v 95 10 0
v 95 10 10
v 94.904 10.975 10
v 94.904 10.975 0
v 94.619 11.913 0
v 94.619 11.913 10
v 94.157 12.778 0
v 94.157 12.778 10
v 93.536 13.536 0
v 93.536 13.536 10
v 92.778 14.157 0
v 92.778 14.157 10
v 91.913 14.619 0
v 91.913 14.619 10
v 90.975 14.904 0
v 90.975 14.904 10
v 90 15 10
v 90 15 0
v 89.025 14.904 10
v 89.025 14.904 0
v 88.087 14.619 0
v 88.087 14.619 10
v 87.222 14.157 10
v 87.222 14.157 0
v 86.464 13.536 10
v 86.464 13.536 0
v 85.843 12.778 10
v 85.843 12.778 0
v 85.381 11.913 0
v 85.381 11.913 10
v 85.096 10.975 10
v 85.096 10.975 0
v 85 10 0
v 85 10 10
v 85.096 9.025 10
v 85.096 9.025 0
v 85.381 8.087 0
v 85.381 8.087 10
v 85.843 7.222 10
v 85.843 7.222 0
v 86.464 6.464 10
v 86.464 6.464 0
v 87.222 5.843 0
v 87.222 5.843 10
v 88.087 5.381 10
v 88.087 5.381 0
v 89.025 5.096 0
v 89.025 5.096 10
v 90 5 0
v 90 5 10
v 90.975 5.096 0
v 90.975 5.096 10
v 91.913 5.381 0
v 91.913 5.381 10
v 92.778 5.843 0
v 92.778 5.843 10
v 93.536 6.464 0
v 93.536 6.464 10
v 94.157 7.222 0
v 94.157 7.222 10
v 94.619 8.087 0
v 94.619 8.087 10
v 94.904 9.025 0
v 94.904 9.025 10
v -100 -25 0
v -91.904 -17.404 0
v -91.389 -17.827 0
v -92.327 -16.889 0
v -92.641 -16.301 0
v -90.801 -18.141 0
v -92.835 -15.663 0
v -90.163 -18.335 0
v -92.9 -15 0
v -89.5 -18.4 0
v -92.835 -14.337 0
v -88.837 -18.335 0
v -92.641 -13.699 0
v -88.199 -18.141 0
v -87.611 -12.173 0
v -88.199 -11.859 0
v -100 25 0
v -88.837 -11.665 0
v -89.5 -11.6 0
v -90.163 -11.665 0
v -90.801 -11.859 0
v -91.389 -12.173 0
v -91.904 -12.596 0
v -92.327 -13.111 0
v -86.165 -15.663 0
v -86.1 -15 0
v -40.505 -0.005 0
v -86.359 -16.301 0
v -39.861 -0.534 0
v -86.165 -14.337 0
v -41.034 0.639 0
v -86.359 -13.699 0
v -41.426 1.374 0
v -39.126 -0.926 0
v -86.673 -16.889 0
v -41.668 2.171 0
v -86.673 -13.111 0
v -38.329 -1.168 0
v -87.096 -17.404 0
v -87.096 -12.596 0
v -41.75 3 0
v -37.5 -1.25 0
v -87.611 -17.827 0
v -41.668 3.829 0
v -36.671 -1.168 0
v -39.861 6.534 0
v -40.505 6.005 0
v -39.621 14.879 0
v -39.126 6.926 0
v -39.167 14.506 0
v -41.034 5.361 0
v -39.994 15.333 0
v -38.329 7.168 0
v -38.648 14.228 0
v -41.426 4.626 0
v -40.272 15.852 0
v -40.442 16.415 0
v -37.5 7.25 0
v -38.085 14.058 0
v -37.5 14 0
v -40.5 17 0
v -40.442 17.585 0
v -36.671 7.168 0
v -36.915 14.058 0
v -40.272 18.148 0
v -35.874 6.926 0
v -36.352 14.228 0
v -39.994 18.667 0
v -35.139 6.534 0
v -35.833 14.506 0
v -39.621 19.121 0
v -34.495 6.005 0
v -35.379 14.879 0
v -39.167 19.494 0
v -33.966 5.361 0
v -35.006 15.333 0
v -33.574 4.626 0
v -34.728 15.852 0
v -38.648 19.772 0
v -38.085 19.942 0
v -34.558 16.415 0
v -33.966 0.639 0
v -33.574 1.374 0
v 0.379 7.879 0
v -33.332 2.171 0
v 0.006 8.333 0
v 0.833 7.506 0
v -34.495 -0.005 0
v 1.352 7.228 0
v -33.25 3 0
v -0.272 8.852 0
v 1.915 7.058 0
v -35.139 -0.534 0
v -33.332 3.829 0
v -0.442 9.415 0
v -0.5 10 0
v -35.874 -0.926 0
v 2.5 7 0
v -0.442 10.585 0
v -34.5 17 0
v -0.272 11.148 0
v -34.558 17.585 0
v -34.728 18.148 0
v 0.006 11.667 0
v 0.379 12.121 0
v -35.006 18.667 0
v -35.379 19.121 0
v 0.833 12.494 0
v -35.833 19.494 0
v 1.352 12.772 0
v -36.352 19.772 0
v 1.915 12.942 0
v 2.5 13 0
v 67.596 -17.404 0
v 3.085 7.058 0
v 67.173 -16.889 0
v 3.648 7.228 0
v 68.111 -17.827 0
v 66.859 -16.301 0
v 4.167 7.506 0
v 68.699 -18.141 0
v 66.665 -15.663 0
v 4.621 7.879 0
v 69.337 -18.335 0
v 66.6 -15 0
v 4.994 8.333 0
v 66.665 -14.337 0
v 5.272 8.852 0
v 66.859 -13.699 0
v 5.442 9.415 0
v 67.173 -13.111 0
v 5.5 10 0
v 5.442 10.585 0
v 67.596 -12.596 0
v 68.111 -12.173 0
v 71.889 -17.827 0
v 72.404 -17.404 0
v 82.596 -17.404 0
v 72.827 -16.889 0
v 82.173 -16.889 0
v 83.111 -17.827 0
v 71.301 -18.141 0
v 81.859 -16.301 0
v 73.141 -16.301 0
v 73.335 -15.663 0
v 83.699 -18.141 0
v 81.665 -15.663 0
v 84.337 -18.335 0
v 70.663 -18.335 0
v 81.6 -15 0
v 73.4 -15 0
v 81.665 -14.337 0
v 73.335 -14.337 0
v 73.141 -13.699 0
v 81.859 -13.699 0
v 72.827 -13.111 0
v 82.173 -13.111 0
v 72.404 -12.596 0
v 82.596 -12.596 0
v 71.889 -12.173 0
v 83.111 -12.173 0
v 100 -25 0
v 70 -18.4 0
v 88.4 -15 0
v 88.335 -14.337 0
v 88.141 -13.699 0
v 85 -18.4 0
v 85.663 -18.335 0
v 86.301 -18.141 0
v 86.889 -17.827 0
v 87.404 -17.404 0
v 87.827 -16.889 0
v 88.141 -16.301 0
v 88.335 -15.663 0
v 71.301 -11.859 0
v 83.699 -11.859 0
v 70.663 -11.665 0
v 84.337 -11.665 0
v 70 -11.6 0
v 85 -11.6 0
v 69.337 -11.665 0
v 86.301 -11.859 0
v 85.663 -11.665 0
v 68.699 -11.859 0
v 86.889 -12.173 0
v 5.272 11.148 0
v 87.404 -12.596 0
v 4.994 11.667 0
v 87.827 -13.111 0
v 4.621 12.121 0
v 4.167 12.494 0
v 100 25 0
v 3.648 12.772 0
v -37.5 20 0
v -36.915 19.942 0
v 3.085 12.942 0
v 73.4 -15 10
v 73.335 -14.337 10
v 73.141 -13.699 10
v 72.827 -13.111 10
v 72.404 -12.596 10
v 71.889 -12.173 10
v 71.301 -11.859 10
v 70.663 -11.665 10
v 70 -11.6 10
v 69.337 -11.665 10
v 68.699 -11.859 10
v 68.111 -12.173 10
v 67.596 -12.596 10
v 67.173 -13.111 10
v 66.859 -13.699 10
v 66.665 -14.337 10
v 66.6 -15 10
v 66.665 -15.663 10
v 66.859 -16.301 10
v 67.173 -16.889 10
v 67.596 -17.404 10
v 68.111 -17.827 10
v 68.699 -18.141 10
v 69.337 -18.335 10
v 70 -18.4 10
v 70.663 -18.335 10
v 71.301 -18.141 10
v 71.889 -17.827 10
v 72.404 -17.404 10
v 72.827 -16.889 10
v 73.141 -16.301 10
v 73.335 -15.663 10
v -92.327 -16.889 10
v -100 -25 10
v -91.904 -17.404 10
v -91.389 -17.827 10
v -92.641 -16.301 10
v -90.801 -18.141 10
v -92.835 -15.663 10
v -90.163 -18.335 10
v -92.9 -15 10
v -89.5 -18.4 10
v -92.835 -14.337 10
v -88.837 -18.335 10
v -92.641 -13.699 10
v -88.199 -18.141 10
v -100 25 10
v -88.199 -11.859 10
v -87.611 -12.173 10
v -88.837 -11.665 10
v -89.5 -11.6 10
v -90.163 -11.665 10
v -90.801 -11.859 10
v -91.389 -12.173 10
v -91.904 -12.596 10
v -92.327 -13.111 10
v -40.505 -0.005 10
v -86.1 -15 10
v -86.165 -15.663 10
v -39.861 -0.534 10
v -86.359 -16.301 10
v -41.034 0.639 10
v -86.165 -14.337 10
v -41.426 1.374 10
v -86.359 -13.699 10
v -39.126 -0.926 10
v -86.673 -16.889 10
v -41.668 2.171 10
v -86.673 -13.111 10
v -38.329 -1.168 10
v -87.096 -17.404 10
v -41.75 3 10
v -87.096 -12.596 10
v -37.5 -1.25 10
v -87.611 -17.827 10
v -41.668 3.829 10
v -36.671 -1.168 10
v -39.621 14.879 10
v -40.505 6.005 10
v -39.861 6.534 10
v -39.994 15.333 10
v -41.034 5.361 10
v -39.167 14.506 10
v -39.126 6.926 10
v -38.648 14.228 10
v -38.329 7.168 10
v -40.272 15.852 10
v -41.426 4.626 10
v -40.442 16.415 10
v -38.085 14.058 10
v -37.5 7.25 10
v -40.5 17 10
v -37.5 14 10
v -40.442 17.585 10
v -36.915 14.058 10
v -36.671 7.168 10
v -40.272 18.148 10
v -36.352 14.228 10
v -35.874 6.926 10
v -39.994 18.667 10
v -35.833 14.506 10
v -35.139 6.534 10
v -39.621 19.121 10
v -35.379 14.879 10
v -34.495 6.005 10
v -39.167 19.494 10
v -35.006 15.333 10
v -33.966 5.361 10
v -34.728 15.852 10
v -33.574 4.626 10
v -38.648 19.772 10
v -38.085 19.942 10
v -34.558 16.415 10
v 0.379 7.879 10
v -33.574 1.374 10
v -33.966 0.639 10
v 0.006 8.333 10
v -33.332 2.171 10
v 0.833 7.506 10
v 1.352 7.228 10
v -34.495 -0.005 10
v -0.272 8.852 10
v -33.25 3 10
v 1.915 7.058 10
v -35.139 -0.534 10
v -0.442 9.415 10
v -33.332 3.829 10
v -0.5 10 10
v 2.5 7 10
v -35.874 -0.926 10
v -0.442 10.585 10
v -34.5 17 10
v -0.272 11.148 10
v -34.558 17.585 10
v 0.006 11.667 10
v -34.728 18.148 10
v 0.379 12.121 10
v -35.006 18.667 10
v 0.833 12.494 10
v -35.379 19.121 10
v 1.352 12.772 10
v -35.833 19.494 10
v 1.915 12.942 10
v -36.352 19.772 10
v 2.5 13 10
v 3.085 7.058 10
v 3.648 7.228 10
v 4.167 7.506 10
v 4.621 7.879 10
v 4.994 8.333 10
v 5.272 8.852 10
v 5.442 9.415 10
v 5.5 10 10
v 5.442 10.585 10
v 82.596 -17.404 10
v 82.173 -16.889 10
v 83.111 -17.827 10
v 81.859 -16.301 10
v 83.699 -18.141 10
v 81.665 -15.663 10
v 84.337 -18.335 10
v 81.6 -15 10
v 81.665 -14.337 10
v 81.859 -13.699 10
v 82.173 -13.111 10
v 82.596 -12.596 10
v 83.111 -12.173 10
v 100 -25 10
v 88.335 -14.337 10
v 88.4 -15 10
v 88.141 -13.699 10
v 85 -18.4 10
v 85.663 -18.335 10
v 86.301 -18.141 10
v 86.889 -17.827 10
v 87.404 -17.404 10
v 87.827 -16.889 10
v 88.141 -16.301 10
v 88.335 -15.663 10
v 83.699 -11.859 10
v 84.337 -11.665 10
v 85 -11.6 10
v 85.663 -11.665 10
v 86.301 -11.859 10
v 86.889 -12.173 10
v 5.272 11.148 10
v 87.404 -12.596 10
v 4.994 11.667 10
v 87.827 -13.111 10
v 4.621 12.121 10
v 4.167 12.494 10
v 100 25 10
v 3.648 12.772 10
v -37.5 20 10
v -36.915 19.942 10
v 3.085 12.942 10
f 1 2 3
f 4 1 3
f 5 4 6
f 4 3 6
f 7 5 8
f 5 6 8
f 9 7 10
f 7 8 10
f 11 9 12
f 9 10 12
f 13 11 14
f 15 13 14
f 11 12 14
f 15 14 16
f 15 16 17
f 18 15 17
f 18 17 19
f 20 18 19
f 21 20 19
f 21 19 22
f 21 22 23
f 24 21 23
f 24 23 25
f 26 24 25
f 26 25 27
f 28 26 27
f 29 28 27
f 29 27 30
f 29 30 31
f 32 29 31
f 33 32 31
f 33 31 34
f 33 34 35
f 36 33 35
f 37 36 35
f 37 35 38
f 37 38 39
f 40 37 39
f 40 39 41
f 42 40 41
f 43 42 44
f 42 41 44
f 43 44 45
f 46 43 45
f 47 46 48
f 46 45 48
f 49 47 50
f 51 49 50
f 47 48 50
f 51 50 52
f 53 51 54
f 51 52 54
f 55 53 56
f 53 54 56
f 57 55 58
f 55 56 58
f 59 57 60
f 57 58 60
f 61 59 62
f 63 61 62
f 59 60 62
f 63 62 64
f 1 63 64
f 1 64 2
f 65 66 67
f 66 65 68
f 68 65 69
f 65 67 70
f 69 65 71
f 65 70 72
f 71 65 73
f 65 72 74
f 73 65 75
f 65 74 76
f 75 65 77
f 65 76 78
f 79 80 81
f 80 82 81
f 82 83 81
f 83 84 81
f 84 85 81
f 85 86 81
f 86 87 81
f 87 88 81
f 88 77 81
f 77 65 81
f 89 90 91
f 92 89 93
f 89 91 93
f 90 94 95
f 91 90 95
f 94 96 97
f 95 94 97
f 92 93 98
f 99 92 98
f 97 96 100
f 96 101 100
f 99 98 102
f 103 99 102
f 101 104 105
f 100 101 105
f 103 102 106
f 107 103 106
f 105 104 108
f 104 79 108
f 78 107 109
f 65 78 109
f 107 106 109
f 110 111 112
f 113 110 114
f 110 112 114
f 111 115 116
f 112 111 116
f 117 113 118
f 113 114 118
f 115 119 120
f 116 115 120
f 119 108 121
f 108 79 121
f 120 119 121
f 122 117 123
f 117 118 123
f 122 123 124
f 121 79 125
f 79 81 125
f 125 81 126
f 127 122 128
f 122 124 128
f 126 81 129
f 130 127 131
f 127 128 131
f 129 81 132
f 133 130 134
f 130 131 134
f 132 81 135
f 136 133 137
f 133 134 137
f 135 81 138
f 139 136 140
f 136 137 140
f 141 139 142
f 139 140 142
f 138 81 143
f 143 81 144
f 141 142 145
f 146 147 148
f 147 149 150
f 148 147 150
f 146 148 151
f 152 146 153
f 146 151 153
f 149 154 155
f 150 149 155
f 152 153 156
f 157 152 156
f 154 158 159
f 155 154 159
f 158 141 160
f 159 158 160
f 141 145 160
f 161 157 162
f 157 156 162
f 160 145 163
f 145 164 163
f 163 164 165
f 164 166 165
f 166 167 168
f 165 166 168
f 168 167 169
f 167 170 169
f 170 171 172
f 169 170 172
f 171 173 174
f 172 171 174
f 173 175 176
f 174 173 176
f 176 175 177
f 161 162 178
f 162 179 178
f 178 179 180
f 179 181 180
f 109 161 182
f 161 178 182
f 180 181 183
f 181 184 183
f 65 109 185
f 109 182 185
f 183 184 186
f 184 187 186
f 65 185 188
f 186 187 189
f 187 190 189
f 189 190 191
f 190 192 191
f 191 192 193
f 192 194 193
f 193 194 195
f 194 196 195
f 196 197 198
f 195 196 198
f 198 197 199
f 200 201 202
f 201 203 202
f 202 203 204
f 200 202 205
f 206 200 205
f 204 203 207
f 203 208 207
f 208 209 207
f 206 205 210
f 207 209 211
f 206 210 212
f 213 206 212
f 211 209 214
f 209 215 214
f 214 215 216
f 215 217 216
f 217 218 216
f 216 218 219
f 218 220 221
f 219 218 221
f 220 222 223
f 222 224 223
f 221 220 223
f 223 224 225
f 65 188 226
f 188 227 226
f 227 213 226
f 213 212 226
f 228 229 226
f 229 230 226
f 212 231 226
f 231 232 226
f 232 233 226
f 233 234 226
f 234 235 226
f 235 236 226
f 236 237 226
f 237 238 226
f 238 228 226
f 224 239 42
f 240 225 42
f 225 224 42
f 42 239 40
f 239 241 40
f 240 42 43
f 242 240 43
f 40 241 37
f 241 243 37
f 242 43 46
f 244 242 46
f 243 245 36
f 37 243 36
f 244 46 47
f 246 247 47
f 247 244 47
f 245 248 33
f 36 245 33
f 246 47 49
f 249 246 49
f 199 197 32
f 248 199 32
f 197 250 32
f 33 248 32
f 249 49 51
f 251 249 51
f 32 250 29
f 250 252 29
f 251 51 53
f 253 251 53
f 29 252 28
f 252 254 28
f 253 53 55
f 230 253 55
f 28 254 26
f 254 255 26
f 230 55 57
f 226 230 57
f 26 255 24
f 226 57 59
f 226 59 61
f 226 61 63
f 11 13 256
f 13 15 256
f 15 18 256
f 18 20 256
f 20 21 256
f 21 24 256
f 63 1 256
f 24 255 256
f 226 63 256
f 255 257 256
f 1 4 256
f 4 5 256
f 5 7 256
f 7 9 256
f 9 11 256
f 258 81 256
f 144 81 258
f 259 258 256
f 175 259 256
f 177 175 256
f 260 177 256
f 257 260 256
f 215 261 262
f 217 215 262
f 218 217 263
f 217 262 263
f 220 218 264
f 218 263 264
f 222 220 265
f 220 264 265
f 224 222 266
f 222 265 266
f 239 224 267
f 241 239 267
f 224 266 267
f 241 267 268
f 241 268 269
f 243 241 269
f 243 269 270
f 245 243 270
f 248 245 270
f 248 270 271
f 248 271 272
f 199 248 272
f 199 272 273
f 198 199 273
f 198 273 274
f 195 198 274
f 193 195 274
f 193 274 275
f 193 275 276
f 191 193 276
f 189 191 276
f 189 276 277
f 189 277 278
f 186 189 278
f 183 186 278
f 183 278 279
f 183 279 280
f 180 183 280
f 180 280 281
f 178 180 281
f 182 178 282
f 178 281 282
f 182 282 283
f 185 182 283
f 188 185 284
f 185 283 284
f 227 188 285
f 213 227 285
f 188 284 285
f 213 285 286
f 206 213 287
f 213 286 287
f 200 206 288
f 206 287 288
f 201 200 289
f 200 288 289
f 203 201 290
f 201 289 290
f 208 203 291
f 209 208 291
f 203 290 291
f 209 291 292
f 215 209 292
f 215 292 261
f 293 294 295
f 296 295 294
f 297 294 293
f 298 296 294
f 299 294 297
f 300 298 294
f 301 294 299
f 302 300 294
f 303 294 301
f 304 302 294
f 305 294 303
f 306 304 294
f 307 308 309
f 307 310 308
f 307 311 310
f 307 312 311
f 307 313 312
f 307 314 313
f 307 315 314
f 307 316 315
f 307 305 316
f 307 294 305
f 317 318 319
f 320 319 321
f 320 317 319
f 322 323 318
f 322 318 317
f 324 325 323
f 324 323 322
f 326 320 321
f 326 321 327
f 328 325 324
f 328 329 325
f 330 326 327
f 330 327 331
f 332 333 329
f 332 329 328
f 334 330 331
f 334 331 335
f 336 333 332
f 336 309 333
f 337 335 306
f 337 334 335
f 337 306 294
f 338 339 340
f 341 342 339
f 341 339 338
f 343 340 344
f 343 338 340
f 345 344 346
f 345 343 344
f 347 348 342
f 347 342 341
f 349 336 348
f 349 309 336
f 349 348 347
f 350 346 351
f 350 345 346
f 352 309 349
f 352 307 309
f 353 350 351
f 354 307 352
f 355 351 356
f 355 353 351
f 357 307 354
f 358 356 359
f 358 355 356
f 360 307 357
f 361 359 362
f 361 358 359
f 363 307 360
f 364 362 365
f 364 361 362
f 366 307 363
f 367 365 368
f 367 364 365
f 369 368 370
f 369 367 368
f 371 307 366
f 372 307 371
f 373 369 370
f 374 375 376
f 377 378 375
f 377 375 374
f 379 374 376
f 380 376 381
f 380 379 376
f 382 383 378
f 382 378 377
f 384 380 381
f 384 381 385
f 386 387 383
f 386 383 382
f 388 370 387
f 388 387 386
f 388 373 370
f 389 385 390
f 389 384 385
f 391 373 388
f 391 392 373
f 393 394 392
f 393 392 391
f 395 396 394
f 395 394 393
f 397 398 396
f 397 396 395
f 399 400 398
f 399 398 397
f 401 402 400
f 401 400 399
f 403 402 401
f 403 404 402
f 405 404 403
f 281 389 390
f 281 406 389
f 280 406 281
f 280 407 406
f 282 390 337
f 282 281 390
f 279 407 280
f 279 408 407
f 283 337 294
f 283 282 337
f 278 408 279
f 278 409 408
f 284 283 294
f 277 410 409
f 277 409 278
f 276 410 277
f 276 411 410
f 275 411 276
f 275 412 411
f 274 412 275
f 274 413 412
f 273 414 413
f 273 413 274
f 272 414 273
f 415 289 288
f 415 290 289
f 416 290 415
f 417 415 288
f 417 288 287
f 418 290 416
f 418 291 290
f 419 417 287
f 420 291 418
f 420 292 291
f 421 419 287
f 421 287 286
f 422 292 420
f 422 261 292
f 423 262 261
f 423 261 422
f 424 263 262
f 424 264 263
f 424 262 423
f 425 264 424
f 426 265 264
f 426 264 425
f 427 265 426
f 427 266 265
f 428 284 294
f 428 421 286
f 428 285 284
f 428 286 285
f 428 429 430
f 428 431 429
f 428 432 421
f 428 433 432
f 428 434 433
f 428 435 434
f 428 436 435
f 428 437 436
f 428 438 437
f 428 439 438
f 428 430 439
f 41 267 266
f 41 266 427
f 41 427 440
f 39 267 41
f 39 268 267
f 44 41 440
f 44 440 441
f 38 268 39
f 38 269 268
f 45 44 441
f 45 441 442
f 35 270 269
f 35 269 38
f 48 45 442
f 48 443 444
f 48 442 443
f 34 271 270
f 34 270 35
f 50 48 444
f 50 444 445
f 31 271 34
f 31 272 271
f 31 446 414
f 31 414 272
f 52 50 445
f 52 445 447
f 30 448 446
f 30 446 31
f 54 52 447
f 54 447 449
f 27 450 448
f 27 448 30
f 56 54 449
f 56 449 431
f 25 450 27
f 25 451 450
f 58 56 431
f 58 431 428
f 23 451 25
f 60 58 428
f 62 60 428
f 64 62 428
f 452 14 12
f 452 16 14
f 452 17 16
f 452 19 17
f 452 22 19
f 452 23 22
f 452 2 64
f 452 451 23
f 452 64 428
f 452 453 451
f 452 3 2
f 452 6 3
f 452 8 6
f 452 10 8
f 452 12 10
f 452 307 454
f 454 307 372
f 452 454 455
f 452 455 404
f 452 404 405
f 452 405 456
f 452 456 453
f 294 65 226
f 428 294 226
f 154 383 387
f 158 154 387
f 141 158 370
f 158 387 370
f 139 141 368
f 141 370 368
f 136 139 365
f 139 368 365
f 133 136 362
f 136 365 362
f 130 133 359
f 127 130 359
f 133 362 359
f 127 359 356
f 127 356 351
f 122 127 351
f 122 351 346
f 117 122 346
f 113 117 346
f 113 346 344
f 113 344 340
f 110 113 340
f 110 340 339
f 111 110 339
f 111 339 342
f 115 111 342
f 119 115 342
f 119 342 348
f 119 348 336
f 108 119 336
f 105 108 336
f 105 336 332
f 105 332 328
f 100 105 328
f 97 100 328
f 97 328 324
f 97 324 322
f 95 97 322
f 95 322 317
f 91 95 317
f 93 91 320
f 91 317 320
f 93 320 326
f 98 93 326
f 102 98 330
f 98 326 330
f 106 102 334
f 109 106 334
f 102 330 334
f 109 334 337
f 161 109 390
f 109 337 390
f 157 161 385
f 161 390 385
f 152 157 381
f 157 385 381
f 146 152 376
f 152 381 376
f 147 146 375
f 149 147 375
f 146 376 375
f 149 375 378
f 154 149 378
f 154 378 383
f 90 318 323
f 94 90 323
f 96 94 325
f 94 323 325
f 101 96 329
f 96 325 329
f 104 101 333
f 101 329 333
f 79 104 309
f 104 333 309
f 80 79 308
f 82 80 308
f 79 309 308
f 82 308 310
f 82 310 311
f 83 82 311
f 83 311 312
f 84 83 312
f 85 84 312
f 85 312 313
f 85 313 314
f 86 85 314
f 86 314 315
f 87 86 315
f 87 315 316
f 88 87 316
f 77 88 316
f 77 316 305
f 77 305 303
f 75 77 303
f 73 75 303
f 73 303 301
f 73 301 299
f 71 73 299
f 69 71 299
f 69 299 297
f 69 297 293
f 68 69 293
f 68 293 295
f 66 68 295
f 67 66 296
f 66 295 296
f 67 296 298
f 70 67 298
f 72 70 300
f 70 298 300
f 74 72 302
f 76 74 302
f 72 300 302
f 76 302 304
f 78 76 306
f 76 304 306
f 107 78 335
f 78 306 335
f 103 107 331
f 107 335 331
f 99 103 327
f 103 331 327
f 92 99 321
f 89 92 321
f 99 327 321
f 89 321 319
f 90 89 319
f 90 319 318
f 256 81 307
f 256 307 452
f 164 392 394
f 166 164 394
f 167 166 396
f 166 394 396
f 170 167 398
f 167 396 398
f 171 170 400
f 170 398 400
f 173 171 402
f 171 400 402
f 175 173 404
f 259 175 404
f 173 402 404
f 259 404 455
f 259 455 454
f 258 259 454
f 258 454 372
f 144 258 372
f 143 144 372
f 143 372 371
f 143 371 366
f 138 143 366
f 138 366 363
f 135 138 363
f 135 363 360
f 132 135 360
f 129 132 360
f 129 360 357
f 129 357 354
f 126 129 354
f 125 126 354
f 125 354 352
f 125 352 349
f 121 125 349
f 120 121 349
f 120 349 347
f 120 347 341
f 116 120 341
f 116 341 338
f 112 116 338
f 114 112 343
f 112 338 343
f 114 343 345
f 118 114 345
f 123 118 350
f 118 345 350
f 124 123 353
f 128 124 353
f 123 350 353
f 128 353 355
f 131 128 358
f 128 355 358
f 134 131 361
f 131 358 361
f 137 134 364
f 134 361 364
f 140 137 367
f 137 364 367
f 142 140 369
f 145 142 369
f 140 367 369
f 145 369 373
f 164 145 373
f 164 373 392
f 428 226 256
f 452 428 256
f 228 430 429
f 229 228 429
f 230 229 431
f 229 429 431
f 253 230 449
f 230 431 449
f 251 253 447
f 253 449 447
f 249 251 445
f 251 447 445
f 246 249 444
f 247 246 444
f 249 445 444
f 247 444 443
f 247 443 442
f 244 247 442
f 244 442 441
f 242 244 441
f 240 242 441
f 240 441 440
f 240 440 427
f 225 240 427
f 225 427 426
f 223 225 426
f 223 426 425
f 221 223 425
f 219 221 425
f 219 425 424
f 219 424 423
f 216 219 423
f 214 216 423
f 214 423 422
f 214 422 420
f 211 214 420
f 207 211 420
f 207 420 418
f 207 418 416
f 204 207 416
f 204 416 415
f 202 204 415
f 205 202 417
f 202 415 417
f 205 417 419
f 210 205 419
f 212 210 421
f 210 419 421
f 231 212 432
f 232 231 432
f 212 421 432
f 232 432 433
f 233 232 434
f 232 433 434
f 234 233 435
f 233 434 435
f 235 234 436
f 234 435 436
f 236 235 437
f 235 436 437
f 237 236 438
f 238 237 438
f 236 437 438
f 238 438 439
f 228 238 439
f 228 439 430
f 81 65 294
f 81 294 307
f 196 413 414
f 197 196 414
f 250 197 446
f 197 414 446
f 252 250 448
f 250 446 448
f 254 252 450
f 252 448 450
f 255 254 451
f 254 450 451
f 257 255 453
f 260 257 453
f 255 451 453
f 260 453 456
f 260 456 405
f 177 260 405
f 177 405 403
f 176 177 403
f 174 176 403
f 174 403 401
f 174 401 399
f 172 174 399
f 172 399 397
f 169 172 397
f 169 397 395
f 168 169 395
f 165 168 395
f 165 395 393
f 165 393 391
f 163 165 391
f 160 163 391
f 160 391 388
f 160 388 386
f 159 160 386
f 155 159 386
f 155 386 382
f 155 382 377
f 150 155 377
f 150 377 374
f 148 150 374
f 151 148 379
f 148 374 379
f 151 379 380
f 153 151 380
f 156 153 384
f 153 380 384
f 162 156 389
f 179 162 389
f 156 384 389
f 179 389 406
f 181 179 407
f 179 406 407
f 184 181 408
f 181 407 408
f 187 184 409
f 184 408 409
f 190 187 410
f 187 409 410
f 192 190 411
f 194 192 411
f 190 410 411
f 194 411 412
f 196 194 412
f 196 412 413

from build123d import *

# Parameters (mm, degrees)
SKETCH1_W           = 200
SKETCH1_H           = 50
BOSS_EXTRUDE1_DEPTH = 10
SKETCH2_R           = 5
SKETCH2_R_2         = 3
SKETCH2_R_3         = 4.25
CUT_EXTRUDE1_DEPTH  = 104.561575886
SKETCH3_R           = 3.4
CUT_EXTRUDE2_DEPTH  = 104.561575886


with BuildPart() as part:
    # Sketch1 → Boss-Extrude1 (new body)
    with BuildSketch(Plane.XY):
        Rectangle(SKETCH1_W, SKETCH1_H)
    extrude(amount=BOSS_EXTRUDE1_DEPTH)

    # Sketch2 → Cut-Extrude1 (cut, through all)
    with BuildSketch(Plane.XY.offset(10)):
        with Locations((90, 10)):
            Circle(SKETCH2_R)
        with Locations((2.5, 10)):
            Circle(SKETCH2_R_2)
        with Locations((-37.5, 17)):
            Circle(SKETCH2_R_2)
        with Locations((-37.5, 3)):
            Circle(SKETCH2_R_3)
    extrude(amount=-CUT_EXTRUDE1_DEPTH, mode=Mode.SUBTRACT)

    # Sketch3 → Cut-Extrude2 (cut, through all)
    with BuildSketch(Plane.XY.offset(10)):
        with Locations((-89.5, -15)):
            Circle(SKETCH3_R)
        with Locations((70, -15)):
            Circle(SKETCH3_R)
        with Locations((85, -15)):
            Circle(SKETCH3_R)
    extrude(amount=-CUT_EXTRUDE2_DEPTH, mode=Mode.SUBTRACT)


solid = part.part
